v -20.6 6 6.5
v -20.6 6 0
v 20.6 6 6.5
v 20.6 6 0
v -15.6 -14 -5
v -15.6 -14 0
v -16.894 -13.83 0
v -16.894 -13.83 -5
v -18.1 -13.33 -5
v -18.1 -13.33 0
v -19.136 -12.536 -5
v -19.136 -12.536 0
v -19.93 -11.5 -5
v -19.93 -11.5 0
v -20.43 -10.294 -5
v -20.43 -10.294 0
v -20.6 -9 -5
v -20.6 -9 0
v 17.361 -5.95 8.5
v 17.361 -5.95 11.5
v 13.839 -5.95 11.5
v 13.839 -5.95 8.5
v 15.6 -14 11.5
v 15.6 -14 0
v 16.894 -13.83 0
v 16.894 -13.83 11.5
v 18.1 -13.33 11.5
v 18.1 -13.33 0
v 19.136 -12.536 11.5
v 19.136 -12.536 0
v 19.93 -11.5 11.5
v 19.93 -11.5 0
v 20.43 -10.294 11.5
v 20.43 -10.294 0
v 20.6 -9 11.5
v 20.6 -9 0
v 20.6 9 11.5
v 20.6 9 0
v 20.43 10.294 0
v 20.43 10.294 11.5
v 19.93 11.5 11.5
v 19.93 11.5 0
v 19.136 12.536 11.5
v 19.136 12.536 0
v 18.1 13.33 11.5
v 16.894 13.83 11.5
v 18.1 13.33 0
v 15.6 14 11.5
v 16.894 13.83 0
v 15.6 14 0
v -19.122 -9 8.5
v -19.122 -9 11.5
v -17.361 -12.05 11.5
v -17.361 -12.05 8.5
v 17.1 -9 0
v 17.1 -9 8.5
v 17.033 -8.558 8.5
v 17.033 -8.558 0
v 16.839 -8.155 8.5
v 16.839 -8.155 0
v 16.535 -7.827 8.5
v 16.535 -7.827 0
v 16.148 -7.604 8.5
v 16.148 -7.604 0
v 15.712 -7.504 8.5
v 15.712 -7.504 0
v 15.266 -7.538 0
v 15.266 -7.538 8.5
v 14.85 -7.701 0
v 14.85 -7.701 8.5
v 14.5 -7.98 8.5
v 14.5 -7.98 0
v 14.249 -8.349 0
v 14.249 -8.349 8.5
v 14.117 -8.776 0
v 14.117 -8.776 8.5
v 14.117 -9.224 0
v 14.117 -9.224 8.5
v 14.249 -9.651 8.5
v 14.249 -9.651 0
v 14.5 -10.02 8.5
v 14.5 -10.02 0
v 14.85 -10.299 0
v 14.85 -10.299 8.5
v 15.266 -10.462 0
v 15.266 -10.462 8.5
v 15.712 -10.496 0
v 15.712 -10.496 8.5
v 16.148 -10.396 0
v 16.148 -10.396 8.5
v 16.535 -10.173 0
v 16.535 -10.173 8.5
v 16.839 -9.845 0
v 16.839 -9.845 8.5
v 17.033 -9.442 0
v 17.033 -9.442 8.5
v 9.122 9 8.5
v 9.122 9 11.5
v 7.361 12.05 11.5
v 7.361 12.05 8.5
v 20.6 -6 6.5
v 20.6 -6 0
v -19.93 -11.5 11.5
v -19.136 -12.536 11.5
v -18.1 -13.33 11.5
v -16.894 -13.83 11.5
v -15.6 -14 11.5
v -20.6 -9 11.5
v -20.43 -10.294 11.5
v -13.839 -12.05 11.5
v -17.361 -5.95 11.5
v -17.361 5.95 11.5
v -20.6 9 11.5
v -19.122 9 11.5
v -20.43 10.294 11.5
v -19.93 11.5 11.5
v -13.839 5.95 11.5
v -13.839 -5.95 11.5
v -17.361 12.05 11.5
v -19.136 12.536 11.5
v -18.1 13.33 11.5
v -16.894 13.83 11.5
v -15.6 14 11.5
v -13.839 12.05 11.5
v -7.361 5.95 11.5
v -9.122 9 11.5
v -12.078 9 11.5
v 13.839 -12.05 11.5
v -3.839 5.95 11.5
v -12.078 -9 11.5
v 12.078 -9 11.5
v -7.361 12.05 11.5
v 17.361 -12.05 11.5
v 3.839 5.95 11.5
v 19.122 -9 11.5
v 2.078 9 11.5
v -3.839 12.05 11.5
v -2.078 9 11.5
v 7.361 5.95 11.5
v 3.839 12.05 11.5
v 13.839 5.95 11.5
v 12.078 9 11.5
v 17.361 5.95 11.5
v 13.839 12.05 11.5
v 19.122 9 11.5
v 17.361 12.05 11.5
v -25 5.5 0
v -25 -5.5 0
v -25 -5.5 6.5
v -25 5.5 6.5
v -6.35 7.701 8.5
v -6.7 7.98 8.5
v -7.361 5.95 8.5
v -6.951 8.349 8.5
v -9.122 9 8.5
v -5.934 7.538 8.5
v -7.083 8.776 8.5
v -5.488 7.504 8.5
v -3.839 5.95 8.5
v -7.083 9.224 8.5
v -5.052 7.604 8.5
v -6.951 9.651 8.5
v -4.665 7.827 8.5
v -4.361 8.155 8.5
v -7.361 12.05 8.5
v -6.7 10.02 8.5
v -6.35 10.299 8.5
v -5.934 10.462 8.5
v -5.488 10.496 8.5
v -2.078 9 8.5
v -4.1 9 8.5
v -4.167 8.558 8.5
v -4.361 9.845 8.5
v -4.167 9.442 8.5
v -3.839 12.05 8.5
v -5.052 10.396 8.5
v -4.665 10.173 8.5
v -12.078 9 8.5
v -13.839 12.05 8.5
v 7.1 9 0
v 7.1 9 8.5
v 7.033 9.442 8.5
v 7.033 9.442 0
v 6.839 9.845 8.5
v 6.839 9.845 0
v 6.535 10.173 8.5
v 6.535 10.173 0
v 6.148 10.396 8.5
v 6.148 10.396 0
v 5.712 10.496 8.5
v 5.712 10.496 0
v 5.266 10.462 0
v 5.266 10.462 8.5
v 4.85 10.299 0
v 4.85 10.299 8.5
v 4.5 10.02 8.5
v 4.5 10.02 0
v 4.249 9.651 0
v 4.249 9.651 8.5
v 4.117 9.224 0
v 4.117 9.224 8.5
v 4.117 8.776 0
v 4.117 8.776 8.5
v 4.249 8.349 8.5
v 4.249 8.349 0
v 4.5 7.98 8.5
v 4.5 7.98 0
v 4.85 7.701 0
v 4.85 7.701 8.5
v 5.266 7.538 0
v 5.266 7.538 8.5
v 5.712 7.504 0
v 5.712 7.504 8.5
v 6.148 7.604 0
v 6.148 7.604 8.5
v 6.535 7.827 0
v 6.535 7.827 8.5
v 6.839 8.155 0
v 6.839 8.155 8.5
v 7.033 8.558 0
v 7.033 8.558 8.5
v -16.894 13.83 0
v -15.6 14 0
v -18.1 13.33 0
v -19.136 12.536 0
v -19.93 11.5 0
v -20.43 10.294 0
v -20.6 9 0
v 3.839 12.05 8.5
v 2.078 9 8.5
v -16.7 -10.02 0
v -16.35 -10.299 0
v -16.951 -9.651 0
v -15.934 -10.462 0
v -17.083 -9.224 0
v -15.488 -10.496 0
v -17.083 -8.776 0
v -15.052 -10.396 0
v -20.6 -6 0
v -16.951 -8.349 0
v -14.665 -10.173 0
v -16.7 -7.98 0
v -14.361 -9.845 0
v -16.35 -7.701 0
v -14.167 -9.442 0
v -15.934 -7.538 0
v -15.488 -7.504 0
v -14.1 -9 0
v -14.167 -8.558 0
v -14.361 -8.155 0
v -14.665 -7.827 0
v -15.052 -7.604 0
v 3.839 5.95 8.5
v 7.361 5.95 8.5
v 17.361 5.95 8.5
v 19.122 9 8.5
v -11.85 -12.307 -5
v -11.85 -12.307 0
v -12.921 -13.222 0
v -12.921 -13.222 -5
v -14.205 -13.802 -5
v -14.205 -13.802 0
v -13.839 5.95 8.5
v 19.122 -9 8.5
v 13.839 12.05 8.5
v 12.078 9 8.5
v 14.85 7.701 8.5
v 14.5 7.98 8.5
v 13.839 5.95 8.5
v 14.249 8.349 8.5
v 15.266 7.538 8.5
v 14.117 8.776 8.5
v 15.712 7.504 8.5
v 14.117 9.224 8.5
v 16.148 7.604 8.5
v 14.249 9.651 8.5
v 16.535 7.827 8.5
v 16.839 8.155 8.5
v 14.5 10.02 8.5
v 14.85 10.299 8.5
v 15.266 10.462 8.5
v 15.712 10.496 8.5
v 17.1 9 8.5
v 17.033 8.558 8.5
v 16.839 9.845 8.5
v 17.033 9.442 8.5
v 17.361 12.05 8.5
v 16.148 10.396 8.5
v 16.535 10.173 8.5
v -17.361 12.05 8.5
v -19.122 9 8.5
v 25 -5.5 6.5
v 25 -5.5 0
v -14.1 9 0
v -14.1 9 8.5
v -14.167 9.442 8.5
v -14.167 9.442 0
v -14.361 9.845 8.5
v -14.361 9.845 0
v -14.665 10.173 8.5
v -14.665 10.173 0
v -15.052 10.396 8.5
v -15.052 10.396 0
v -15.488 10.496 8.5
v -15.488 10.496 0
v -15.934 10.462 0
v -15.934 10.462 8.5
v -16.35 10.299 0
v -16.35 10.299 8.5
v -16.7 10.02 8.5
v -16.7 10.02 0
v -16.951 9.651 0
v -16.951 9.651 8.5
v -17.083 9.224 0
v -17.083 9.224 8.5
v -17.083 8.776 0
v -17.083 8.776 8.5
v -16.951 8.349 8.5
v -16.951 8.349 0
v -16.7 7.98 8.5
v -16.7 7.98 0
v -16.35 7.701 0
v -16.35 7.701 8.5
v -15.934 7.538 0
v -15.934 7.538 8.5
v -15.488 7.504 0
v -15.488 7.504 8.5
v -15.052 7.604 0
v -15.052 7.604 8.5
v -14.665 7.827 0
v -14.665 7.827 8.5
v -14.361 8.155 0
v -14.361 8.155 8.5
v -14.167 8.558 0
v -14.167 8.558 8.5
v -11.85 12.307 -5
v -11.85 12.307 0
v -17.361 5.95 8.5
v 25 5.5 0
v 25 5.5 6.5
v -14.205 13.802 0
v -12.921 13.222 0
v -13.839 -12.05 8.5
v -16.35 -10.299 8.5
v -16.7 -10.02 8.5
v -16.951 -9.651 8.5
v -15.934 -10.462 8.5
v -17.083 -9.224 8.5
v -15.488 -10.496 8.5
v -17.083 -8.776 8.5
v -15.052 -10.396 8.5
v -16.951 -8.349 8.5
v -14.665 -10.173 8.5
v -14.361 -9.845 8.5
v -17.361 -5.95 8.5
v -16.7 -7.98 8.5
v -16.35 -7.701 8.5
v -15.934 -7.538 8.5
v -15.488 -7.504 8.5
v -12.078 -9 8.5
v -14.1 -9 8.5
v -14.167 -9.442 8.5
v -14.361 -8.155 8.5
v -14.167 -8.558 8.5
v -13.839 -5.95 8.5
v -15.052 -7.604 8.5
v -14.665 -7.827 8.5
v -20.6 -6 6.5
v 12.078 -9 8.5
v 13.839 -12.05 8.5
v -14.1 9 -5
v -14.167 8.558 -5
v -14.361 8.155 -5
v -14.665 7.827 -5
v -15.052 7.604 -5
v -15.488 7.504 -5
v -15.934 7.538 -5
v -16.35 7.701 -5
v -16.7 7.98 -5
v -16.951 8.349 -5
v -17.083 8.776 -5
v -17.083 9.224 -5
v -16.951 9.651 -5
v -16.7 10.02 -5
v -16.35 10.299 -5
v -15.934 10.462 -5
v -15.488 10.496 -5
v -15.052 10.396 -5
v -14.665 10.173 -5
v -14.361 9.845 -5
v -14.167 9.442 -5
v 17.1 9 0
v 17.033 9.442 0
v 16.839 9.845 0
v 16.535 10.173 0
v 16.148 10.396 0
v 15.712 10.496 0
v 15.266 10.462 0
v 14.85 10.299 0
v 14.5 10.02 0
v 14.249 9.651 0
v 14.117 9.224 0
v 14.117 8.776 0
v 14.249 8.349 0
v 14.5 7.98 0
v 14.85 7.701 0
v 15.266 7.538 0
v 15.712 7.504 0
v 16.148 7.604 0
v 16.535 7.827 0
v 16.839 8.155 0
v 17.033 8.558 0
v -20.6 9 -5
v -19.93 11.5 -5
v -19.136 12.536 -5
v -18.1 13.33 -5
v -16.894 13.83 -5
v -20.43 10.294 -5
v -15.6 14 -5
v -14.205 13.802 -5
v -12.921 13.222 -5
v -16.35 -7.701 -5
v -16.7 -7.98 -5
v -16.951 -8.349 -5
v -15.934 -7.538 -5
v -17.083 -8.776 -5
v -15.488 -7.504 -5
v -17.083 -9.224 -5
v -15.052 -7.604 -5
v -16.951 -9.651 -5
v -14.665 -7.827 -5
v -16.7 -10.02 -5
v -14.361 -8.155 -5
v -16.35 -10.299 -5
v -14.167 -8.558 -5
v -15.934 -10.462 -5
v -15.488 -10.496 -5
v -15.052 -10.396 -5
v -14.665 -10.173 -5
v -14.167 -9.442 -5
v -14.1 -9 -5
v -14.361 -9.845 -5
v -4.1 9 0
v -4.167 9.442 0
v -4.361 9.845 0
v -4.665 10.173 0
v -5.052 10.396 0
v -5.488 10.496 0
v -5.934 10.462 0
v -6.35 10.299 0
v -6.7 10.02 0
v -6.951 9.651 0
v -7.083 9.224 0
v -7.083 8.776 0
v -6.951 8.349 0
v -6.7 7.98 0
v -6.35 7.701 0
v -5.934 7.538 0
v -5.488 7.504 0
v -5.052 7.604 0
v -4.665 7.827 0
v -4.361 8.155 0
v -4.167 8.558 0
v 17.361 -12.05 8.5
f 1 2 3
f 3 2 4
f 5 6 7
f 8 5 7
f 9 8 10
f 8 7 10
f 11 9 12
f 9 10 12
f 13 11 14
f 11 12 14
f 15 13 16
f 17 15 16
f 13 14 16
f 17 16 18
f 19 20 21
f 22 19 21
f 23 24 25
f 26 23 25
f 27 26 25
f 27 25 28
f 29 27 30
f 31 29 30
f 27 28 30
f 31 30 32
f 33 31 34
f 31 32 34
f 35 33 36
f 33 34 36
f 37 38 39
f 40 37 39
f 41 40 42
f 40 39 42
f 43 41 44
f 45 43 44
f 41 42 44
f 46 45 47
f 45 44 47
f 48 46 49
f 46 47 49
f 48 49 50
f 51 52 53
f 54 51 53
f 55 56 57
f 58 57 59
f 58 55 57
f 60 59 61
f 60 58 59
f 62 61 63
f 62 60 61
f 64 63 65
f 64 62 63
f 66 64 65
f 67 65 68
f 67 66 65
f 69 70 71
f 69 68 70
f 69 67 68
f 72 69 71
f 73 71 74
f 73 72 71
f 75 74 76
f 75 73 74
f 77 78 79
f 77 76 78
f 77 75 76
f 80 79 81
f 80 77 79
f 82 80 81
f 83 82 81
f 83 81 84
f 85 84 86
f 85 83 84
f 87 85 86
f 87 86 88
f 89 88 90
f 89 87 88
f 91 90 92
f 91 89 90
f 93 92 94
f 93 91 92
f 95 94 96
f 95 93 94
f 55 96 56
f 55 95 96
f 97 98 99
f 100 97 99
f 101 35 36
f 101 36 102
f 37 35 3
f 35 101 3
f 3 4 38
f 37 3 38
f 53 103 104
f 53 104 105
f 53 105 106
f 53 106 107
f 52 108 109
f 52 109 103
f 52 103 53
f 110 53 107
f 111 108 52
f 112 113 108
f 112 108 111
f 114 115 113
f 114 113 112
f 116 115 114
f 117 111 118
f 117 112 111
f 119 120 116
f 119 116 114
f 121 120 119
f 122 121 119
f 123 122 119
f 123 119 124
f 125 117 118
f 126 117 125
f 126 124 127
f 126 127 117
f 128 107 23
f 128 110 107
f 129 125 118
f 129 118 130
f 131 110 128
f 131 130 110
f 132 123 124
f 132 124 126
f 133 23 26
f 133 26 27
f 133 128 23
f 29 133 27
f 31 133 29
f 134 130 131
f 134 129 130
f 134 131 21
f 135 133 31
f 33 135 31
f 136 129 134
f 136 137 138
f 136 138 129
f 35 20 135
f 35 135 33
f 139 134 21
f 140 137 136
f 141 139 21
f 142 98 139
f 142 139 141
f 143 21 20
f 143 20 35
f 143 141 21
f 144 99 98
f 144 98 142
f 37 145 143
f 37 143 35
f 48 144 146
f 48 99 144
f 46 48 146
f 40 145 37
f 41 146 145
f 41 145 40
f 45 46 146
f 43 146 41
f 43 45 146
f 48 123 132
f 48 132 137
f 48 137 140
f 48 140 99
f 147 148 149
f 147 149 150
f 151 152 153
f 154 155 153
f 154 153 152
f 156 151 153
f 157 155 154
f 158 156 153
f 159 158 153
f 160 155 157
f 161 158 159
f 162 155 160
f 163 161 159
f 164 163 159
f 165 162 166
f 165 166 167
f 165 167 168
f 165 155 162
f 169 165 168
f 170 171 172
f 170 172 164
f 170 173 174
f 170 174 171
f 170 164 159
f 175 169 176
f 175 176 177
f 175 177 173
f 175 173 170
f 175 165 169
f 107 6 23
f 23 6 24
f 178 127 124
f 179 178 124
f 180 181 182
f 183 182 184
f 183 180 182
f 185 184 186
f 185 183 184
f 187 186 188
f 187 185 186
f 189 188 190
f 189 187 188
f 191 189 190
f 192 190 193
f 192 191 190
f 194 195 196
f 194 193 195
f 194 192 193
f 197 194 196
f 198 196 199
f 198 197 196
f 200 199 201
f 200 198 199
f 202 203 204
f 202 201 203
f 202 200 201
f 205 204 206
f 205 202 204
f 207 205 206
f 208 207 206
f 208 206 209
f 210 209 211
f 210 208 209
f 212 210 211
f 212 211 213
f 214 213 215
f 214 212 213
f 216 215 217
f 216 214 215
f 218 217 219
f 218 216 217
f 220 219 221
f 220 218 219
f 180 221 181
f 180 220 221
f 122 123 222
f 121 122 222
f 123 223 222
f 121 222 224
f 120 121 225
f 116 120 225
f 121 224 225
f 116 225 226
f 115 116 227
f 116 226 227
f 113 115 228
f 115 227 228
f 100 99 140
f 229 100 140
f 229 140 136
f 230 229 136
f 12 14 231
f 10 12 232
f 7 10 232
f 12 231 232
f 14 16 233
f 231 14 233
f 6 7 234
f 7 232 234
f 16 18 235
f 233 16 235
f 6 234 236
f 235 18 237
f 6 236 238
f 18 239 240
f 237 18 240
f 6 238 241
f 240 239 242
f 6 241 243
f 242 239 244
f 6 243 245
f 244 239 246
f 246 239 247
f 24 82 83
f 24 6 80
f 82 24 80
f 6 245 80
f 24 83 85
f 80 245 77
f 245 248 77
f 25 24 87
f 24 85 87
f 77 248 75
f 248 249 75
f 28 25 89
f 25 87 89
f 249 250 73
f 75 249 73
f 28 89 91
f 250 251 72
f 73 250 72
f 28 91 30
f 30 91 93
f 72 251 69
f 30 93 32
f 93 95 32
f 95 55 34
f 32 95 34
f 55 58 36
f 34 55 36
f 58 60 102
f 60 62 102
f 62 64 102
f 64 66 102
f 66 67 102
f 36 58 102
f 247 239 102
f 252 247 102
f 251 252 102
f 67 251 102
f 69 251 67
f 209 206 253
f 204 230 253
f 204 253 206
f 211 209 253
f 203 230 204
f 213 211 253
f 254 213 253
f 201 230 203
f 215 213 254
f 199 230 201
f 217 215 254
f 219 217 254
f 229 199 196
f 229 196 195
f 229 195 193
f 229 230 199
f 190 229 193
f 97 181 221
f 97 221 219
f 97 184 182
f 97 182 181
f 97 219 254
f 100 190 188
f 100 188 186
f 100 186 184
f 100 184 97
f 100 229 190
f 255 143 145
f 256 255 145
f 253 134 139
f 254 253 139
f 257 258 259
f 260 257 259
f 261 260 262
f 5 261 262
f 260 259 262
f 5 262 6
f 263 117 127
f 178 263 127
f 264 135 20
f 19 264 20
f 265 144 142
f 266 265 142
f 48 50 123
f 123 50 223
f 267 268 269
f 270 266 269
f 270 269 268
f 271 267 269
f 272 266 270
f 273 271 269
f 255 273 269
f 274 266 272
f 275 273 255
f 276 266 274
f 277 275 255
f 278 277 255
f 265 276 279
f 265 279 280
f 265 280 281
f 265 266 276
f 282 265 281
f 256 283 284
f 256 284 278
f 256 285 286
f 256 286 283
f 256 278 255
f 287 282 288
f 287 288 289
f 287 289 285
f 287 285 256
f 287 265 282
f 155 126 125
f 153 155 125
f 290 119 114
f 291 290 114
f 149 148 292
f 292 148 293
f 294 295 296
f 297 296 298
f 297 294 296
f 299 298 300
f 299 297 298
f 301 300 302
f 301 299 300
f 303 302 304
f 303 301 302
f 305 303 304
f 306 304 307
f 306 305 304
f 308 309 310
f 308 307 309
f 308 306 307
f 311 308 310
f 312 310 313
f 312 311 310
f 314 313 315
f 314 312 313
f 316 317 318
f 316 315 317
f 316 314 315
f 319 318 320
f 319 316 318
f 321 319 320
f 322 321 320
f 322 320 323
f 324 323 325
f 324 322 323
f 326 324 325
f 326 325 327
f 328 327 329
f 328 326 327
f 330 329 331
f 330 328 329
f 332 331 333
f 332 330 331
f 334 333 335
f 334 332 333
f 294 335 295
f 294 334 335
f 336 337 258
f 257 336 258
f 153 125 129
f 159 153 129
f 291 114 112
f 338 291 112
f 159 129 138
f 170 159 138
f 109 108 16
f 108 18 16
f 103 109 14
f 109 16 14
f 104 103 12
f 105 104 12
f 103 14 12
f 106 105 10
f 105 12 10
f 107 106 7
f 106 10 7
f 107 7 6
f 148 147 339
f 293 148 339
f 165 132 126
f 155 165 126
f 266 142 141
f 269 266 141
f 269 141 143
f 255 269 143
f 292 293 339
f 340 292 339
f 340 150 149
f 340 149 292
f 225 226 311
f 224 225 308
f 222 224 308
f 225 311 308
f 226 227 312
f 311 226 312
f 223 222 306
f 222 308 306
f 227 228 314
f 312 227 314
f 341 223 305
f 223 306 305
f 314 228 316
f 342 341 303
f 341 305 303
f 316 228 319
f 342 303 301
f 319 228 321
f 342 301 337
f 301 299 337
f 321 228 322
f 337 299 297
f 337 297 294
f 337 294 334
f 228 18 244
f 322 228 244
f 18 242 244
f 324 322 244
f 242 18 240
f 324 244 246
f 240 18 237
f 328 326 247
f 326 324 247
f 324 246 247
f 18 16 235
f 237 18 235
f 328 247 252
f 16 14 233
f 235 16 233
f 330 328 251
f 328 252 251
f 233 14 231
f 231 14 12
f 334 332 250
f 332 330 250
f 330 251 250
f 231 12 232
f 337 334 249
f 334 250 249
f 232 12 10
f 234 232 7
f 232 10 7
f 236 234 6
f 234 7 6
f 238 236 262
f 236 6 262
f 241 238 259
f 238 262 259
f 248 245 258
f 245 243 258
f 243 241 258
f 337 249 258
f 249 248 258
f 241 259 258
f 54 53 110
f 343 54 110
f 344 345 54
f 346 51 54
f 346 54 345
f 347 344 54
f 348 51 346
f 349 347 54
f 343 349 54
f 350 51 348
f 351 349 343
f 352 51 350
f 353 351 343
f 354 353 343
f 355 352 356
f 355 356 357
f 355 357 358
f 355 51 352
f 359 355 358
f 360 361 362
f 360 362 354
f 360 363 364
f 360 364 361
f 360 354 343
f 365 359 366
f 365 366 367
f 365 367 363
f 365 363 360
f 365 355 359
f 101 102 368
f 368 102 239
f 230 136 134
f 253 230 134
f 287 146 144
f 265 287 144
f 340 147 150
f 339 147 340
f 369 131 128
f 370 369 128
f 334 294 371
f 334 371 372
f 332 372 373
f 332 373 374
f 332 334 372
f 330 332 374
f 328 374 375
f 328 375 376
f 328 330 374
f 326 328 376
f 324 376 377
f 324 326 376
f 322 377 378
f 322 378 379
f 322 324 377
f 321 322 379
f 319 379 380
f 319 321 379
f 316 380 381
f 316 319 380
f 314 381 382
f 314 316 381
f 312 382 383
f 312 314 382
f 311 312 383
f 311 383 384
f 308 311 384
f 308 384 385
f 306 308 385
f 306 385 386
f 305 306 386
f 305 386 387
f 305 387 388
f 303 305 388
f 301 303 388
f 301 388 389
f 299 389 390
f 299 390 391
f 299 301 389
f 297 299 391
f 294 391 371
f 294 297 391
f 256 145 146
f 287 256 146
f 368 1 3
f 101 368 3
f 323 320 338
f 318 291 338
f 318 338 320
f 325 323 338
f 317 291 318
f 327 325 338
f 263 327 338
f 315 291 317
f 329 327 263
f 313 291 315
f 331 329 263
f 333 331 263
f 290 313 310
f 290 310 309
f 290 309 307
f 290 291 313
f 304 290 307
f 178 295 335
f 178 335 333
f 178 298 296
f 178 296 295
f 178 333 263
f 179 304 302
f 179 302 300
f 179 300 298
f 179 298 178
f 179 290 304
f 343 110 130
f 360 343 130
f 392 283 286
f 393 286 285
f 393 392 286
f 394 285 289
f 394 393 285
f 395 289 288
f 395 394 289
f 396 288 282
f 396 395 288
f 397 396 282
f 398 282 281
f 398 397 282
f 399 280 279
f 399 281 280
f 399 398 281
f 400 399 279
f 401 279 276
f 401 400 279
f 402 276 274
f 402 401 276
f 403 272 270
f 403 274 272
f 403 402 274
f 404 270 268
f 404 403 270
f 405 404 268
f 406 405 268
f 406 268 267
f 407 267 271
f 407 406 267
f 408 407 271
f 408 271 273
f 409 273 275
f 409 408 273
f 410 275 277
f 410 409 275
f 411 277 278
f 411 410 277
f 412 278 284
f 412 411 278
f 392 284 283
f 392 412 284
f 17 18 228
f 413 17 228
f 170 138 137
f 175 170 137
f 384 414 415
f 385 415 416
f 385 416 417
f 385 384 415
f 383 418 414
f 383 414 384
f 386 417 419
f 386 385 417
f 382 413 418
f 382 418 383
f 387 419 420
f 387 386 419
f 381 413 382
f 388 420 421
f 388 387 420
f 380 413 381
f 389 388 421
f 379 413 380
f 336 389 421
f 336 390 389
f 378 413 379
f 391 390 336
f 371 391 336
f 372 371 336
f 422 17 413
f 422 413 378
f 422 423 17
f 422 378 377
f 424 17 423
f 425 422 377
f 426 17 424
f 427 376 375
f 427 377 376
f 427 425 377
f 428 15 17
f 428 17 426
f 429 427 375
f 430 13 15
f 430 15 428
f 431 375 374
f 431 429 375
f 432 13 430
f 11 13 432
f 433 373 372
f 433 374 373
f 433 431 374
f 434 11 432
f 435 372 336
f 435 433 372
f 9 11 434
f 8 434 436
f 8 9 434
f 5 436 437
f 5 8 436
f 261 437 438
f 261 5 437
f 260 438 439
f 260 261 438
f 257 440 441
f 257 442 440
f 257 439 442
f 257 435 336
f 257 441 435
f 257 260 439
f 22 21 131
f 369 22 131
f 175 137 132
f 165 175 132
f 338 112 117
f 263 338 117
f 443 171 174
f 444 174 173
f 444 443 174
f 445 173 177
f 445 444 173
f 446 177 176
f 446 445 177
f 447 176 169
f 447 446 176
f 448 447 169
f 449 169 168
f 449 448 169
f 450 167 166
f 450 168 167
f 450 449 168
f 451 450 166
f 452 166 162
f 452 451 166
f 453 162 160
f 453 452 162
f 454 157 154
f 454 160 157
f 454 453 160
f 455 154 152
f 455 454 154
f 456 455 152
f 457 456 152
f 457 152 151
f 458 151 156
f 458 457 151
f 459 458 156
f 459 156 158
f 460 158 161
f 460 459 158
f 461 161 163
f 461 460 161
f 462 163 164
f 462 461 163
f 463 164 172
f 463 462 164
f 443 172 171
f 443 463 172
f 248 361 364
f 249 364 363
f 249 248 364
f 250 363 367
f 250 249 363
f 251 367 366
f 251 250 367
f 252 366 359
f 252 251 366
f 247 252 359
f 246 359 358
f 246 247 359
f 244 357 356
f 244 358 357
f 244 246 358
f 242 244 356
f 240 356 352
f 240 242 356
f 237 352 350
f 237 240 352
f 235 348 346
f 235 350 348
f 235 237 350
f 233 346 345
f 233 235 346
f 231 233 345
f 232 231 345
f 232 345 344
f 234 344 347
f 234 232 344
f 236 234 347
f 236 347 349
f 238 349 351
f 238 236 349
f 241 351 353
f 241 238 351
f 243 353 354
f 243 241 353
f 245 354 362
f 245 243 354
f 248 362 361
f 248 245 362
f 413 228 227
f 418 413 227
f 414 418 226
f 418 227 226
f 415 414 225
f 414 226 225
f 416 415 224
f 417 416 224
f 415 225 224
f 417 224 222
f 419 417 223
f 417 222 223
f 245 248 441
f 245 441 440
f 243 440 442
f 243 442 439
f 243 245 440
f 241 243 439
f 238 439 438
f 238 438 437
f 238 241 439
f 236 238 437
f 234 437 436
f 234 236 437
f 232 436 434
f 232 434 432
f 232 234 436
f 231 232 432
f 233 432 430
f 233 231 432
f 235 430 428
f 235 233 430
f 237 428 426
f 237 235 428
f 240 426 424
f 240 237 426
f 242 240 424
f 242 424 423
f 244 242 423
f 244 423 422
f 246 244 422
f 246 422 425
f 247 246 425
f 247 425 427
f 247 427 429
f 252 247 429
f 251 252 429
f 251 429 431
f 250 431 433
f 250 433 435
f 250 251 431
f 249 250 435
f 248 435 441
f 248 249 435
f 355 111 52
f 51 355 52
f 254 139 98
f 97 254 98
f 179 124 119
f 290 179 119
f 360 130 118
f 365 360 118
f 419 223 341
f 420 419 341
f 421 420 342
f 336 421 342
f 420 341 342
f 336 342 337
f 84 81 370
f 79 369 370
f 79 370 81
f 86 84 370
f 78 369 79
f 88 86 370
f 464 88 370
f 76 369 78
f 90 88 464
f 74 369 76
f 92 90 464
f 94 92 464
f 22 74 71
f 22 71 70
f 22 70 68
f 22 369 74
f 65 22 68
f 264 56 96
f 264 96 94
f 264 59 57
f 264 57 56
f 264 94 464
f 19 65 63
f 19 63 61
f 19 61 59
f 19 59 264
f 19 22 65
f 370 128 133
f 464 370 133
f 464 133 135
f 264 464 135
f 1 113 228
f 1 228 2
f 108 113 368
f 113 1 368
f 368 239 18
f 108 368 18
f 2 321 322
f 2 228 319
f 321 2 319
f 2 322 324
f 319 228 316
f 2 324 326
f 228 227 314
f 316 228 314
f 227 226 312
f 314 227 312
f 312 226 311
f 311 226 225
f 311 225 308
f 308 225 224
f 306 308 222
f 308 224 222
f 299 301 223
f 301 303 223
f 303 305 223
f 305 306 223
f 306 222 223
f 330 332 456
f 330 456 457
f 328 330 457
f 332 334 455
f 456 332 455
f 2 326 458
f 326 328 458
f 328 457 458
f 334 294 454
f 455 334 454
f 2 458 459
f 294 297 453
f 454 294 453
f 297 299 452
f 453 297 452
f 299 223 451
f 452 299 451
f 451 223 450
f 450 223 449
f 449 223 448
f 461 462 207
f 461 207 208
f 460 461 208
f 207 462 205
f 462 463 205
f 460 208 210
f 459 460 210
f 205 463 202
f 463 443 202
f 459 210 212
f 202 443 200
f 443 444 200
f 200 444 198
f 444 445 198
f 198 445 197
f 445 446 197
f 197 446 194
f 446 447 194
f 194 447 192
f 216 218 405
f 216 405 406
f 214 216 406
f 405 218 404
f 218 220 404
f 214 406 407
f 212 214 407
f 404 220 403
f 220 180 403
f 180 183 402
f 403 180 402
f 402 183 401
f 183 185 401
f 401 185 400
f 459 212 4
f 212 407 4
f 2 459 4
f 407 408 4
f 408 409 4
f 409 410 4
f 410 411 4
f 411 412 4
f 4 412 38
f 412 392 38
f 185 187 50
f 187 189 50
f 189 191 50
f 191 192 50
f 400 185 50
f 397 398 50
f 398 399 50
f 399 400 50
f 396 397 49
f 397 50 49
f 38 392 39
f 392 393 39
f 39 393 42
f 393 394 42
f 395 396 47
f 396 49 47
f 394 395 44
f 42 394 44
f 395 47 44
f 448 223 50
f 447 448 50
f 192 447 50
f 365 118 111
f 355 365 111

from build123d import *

# Parameters (mm, degrees)
F0_W     = 50
F0_H     = 11
F1_DEPTH = 6.5
F2_R     = 1.5
F3_DEPTH = 6.5
F4_R     = 1.5
F5_DEPTH = 5
F6_R     = 1.5
F7_DEPTH = 5
F9_DEPTH = 3


with BuildPart() as f1:
    # F0 (on Top) → F1 (new body)
    with BuildSketch(Plane.XY):
        Rectangle(F0_W, F0_H)
    extrude(amount=F1_DEPTH)


with BuildPart() as f3:
    # F2 (on Top) → F3 (new body)
    with BuildSketch(Plane.XY):
        with BuildLine():
            Line((15.6, 14), (0, 14))
            Line((0, 14), (-15.6, 14))
            ThreePointArc((-15.6, 14), (-19.1355339059, 12.5355339059), (-20.6, 9))
            Line((-20.6, 9), (-20.6, 6))
            Line((-20.6, 6), (0, 6))
            Line((0, 6), (20.6, 6))
            Line((20.6, 6), (20.6, 9))
            ThreePointArc((20.6, 9), (19.1355339059, 12.5355339059), (15.6, 14))
        make_face()
        with Locations((-15.6, 9)):
            Circle(F2_R, mode=Mode.SUBTRACT)
        with Locations((-5.6, 9)):
            Circle(F2_R, mode=Mode.SUBTRACT)
        with Locations((5.6, 9)):
            Circle(F2_R, mode=Mode.SUBTRACT)
        with Locations((15.6, 9)):
            Circle(F2_R, mode=Mode.SUBTRACT)
    extrude(amount=F3_DEPTH)



with BuildPart() as f3b:
    # F2 (on Top) → F3, piece 2 (new body)
    with BuildSketch(Plane.XY):
        with BuildLine():
            Line((0, -6), (-20.6, -6))
            Line((-20.6, -6), (-20.6, -9))
            ThreePointArc((-20.6, -9), (-19.1355339059, -12.5355339059), (-15.6, -14))
            Line((-15.6, -14), (0, -14))
            Line((0, -14), (15.6, -14))
            ThreePointArc((15.6, -14), (19.1355339059, -12.5355339059), (20.6, -9))
            Line((20.6, -9), (20.6, -6))
            Line((20.6, -6), (0, -6))
        make_face()
        with Locations((-15.6, -9)):
            Circle(F2_R, mode=Mode.SUBTRACT)
        with Locations((15.6, -9)):
            Circle(F2_R, mode=Mode.SUBTRACT)
    extrude(amount=F3_DEPTH)


with BuildPart() as f3_1:
    add(f3.part)

    add(f3b.part)  # F5 merges F3b
    # F4 (on face) → F5 (join)
    with BuildSketch(Plane.XY.offset(6.5)):
        with BuildLine():
            Line((15.6, 14), (0, 14))
            Line((0, 14), (-15.6, 14))
            ThreePointArc((-15.6, 14), (-19.1355339059, 12.5355339059), (-20.6, 9))
            Line((-20.6, 9), (-20.6, -9))
            ThreePointArc((-20.6, -9), (-19.1355339059, -12.5355339059), (-15.6, -14))
            Line((-15.6, -14), (0, -14))
            Line((0, -14), (15.6, -14))
            ThreePointArc((15.6, -14), (19.1355339059, -12.5355339059), (20.6, -9))
            Line((20.6, -9), (20.6, 9))
            ThreePointArc((20.6, 9), (19.1355339059, 12.5355339059), (15.6, 14))
        make_face()
        with Locations((-15.6, -9)):
            Circle(F4_R, mode=Mode.SUBTRACT)
        with Locations((15.6, -9)):
            Circle(F4_R, mode=Mode.SUBTRACT)
        with Locations((-15.6, 9)):
            Circle(F4_R, mode=Mode.SUBTRACT)
        with Locations((-5.6, 9)):
            Circle(F4_R, mode=Mode.SUBTRACT)
        with Locations((5.6, 9)):
            Circle(F4_R, mode=Mode.SUBTRACT)
        with Locations((15.6, 9)):
            Circle(F4_R, mode=Mode.SUBTRACT)
    extrude(amount=F5_DEPTH)

    # F8 (on face) → F9 (cut)
    with BuildSketch(Plane.XY.offset(11.5)):
        Polygon((-13.839081679, 12.05), (-17.360918321, 12.05), (-19.1218366421, 9), (-17.360918321, 5.95), (-13.839081679, 5.95), (-12.0781633579, 9), align=None)
        Polygon((17.360918321, 5.95), (19.1218366421, 9), (17.360918321, 12.05), (13.839081679, 12.05), (12.0781633579, 9), (13.839081679, 5.95), align=None)
        Polygon((-19.1218366421, -9), (-17.360918321, -12.05), (-13.839081679, -12.05), (-12.0781633579, -9), (-13.839081679, -5.95), (-17.360918321, -5.95), align=None)
        Polygon((13.839081679, -12.05), (17.360918321, -12.05), (19.1218366421, -9), (17.360918321, -5.95), (13.839081679, -5.95), (12.0781633579, -9), align=None)
        Polygon((-2.0781633579, 9), (-3.839081679, 12.05), (-7.360918321, 12.05), (-9.1218366421, 9), (-7.360918321, 5.95), (-3.839081679, 5.95), align=None)
        Polygon((3.839081679, 5.95), (7.360918321, 5.95), (9.1218366421, 9), (7.360918321, 12.05), (3.839081679, 12.05), (2.0781633579, 9), align=None)
    extrude(amount=-F9_DEPTH, mode=Mode.SUBTRACT)


with BuildPart() as f7:
    # F6 (on face) → F7 (new body)
    with BuildSketch(Plane(origin=(0, 0, 0), x_dir=(1, 0, 0), z_dir=(0, 0, -1))):
        with BuildLine():
            ThreePointArc((-15.6, 14), (-19.1355339059, 12.5355339059), (-20.6, 9))
            Line((-20.6, 9), (-20.6, 0))
            Line((-20.6, 0), (-20.6, -9))
            ThreePointArc((-20.6, -9), (-19.1355339059, -12.5355339059), (-15.6, -14))
            ThreePointArc((-15.6, -14), (-13.5428108612, -13.5571891388), (-11.85, -12.3071891388))
            Line((-11.85, -12.3071891388), (-11.85, 9))
            Line((-11.85, 9), (-11.85, 12.3071891388))
            ThreePointArc((-11.85, 12.3071891388), (-13.5428108612, 13.5571891388), (-15.6, 14))
        make_face()
        with Locations((-15.6, -9)):
            Circle(F6_R, mode=Mode.SUBTRACT)
        with Locations((-15.6, 9)):
            Circle(F6_R, mode=Mode.SUBTRACT)
    extrude(amount=F7_DEPTH)


solid = Compound([f1.part, f3_1.part, f7.part])
